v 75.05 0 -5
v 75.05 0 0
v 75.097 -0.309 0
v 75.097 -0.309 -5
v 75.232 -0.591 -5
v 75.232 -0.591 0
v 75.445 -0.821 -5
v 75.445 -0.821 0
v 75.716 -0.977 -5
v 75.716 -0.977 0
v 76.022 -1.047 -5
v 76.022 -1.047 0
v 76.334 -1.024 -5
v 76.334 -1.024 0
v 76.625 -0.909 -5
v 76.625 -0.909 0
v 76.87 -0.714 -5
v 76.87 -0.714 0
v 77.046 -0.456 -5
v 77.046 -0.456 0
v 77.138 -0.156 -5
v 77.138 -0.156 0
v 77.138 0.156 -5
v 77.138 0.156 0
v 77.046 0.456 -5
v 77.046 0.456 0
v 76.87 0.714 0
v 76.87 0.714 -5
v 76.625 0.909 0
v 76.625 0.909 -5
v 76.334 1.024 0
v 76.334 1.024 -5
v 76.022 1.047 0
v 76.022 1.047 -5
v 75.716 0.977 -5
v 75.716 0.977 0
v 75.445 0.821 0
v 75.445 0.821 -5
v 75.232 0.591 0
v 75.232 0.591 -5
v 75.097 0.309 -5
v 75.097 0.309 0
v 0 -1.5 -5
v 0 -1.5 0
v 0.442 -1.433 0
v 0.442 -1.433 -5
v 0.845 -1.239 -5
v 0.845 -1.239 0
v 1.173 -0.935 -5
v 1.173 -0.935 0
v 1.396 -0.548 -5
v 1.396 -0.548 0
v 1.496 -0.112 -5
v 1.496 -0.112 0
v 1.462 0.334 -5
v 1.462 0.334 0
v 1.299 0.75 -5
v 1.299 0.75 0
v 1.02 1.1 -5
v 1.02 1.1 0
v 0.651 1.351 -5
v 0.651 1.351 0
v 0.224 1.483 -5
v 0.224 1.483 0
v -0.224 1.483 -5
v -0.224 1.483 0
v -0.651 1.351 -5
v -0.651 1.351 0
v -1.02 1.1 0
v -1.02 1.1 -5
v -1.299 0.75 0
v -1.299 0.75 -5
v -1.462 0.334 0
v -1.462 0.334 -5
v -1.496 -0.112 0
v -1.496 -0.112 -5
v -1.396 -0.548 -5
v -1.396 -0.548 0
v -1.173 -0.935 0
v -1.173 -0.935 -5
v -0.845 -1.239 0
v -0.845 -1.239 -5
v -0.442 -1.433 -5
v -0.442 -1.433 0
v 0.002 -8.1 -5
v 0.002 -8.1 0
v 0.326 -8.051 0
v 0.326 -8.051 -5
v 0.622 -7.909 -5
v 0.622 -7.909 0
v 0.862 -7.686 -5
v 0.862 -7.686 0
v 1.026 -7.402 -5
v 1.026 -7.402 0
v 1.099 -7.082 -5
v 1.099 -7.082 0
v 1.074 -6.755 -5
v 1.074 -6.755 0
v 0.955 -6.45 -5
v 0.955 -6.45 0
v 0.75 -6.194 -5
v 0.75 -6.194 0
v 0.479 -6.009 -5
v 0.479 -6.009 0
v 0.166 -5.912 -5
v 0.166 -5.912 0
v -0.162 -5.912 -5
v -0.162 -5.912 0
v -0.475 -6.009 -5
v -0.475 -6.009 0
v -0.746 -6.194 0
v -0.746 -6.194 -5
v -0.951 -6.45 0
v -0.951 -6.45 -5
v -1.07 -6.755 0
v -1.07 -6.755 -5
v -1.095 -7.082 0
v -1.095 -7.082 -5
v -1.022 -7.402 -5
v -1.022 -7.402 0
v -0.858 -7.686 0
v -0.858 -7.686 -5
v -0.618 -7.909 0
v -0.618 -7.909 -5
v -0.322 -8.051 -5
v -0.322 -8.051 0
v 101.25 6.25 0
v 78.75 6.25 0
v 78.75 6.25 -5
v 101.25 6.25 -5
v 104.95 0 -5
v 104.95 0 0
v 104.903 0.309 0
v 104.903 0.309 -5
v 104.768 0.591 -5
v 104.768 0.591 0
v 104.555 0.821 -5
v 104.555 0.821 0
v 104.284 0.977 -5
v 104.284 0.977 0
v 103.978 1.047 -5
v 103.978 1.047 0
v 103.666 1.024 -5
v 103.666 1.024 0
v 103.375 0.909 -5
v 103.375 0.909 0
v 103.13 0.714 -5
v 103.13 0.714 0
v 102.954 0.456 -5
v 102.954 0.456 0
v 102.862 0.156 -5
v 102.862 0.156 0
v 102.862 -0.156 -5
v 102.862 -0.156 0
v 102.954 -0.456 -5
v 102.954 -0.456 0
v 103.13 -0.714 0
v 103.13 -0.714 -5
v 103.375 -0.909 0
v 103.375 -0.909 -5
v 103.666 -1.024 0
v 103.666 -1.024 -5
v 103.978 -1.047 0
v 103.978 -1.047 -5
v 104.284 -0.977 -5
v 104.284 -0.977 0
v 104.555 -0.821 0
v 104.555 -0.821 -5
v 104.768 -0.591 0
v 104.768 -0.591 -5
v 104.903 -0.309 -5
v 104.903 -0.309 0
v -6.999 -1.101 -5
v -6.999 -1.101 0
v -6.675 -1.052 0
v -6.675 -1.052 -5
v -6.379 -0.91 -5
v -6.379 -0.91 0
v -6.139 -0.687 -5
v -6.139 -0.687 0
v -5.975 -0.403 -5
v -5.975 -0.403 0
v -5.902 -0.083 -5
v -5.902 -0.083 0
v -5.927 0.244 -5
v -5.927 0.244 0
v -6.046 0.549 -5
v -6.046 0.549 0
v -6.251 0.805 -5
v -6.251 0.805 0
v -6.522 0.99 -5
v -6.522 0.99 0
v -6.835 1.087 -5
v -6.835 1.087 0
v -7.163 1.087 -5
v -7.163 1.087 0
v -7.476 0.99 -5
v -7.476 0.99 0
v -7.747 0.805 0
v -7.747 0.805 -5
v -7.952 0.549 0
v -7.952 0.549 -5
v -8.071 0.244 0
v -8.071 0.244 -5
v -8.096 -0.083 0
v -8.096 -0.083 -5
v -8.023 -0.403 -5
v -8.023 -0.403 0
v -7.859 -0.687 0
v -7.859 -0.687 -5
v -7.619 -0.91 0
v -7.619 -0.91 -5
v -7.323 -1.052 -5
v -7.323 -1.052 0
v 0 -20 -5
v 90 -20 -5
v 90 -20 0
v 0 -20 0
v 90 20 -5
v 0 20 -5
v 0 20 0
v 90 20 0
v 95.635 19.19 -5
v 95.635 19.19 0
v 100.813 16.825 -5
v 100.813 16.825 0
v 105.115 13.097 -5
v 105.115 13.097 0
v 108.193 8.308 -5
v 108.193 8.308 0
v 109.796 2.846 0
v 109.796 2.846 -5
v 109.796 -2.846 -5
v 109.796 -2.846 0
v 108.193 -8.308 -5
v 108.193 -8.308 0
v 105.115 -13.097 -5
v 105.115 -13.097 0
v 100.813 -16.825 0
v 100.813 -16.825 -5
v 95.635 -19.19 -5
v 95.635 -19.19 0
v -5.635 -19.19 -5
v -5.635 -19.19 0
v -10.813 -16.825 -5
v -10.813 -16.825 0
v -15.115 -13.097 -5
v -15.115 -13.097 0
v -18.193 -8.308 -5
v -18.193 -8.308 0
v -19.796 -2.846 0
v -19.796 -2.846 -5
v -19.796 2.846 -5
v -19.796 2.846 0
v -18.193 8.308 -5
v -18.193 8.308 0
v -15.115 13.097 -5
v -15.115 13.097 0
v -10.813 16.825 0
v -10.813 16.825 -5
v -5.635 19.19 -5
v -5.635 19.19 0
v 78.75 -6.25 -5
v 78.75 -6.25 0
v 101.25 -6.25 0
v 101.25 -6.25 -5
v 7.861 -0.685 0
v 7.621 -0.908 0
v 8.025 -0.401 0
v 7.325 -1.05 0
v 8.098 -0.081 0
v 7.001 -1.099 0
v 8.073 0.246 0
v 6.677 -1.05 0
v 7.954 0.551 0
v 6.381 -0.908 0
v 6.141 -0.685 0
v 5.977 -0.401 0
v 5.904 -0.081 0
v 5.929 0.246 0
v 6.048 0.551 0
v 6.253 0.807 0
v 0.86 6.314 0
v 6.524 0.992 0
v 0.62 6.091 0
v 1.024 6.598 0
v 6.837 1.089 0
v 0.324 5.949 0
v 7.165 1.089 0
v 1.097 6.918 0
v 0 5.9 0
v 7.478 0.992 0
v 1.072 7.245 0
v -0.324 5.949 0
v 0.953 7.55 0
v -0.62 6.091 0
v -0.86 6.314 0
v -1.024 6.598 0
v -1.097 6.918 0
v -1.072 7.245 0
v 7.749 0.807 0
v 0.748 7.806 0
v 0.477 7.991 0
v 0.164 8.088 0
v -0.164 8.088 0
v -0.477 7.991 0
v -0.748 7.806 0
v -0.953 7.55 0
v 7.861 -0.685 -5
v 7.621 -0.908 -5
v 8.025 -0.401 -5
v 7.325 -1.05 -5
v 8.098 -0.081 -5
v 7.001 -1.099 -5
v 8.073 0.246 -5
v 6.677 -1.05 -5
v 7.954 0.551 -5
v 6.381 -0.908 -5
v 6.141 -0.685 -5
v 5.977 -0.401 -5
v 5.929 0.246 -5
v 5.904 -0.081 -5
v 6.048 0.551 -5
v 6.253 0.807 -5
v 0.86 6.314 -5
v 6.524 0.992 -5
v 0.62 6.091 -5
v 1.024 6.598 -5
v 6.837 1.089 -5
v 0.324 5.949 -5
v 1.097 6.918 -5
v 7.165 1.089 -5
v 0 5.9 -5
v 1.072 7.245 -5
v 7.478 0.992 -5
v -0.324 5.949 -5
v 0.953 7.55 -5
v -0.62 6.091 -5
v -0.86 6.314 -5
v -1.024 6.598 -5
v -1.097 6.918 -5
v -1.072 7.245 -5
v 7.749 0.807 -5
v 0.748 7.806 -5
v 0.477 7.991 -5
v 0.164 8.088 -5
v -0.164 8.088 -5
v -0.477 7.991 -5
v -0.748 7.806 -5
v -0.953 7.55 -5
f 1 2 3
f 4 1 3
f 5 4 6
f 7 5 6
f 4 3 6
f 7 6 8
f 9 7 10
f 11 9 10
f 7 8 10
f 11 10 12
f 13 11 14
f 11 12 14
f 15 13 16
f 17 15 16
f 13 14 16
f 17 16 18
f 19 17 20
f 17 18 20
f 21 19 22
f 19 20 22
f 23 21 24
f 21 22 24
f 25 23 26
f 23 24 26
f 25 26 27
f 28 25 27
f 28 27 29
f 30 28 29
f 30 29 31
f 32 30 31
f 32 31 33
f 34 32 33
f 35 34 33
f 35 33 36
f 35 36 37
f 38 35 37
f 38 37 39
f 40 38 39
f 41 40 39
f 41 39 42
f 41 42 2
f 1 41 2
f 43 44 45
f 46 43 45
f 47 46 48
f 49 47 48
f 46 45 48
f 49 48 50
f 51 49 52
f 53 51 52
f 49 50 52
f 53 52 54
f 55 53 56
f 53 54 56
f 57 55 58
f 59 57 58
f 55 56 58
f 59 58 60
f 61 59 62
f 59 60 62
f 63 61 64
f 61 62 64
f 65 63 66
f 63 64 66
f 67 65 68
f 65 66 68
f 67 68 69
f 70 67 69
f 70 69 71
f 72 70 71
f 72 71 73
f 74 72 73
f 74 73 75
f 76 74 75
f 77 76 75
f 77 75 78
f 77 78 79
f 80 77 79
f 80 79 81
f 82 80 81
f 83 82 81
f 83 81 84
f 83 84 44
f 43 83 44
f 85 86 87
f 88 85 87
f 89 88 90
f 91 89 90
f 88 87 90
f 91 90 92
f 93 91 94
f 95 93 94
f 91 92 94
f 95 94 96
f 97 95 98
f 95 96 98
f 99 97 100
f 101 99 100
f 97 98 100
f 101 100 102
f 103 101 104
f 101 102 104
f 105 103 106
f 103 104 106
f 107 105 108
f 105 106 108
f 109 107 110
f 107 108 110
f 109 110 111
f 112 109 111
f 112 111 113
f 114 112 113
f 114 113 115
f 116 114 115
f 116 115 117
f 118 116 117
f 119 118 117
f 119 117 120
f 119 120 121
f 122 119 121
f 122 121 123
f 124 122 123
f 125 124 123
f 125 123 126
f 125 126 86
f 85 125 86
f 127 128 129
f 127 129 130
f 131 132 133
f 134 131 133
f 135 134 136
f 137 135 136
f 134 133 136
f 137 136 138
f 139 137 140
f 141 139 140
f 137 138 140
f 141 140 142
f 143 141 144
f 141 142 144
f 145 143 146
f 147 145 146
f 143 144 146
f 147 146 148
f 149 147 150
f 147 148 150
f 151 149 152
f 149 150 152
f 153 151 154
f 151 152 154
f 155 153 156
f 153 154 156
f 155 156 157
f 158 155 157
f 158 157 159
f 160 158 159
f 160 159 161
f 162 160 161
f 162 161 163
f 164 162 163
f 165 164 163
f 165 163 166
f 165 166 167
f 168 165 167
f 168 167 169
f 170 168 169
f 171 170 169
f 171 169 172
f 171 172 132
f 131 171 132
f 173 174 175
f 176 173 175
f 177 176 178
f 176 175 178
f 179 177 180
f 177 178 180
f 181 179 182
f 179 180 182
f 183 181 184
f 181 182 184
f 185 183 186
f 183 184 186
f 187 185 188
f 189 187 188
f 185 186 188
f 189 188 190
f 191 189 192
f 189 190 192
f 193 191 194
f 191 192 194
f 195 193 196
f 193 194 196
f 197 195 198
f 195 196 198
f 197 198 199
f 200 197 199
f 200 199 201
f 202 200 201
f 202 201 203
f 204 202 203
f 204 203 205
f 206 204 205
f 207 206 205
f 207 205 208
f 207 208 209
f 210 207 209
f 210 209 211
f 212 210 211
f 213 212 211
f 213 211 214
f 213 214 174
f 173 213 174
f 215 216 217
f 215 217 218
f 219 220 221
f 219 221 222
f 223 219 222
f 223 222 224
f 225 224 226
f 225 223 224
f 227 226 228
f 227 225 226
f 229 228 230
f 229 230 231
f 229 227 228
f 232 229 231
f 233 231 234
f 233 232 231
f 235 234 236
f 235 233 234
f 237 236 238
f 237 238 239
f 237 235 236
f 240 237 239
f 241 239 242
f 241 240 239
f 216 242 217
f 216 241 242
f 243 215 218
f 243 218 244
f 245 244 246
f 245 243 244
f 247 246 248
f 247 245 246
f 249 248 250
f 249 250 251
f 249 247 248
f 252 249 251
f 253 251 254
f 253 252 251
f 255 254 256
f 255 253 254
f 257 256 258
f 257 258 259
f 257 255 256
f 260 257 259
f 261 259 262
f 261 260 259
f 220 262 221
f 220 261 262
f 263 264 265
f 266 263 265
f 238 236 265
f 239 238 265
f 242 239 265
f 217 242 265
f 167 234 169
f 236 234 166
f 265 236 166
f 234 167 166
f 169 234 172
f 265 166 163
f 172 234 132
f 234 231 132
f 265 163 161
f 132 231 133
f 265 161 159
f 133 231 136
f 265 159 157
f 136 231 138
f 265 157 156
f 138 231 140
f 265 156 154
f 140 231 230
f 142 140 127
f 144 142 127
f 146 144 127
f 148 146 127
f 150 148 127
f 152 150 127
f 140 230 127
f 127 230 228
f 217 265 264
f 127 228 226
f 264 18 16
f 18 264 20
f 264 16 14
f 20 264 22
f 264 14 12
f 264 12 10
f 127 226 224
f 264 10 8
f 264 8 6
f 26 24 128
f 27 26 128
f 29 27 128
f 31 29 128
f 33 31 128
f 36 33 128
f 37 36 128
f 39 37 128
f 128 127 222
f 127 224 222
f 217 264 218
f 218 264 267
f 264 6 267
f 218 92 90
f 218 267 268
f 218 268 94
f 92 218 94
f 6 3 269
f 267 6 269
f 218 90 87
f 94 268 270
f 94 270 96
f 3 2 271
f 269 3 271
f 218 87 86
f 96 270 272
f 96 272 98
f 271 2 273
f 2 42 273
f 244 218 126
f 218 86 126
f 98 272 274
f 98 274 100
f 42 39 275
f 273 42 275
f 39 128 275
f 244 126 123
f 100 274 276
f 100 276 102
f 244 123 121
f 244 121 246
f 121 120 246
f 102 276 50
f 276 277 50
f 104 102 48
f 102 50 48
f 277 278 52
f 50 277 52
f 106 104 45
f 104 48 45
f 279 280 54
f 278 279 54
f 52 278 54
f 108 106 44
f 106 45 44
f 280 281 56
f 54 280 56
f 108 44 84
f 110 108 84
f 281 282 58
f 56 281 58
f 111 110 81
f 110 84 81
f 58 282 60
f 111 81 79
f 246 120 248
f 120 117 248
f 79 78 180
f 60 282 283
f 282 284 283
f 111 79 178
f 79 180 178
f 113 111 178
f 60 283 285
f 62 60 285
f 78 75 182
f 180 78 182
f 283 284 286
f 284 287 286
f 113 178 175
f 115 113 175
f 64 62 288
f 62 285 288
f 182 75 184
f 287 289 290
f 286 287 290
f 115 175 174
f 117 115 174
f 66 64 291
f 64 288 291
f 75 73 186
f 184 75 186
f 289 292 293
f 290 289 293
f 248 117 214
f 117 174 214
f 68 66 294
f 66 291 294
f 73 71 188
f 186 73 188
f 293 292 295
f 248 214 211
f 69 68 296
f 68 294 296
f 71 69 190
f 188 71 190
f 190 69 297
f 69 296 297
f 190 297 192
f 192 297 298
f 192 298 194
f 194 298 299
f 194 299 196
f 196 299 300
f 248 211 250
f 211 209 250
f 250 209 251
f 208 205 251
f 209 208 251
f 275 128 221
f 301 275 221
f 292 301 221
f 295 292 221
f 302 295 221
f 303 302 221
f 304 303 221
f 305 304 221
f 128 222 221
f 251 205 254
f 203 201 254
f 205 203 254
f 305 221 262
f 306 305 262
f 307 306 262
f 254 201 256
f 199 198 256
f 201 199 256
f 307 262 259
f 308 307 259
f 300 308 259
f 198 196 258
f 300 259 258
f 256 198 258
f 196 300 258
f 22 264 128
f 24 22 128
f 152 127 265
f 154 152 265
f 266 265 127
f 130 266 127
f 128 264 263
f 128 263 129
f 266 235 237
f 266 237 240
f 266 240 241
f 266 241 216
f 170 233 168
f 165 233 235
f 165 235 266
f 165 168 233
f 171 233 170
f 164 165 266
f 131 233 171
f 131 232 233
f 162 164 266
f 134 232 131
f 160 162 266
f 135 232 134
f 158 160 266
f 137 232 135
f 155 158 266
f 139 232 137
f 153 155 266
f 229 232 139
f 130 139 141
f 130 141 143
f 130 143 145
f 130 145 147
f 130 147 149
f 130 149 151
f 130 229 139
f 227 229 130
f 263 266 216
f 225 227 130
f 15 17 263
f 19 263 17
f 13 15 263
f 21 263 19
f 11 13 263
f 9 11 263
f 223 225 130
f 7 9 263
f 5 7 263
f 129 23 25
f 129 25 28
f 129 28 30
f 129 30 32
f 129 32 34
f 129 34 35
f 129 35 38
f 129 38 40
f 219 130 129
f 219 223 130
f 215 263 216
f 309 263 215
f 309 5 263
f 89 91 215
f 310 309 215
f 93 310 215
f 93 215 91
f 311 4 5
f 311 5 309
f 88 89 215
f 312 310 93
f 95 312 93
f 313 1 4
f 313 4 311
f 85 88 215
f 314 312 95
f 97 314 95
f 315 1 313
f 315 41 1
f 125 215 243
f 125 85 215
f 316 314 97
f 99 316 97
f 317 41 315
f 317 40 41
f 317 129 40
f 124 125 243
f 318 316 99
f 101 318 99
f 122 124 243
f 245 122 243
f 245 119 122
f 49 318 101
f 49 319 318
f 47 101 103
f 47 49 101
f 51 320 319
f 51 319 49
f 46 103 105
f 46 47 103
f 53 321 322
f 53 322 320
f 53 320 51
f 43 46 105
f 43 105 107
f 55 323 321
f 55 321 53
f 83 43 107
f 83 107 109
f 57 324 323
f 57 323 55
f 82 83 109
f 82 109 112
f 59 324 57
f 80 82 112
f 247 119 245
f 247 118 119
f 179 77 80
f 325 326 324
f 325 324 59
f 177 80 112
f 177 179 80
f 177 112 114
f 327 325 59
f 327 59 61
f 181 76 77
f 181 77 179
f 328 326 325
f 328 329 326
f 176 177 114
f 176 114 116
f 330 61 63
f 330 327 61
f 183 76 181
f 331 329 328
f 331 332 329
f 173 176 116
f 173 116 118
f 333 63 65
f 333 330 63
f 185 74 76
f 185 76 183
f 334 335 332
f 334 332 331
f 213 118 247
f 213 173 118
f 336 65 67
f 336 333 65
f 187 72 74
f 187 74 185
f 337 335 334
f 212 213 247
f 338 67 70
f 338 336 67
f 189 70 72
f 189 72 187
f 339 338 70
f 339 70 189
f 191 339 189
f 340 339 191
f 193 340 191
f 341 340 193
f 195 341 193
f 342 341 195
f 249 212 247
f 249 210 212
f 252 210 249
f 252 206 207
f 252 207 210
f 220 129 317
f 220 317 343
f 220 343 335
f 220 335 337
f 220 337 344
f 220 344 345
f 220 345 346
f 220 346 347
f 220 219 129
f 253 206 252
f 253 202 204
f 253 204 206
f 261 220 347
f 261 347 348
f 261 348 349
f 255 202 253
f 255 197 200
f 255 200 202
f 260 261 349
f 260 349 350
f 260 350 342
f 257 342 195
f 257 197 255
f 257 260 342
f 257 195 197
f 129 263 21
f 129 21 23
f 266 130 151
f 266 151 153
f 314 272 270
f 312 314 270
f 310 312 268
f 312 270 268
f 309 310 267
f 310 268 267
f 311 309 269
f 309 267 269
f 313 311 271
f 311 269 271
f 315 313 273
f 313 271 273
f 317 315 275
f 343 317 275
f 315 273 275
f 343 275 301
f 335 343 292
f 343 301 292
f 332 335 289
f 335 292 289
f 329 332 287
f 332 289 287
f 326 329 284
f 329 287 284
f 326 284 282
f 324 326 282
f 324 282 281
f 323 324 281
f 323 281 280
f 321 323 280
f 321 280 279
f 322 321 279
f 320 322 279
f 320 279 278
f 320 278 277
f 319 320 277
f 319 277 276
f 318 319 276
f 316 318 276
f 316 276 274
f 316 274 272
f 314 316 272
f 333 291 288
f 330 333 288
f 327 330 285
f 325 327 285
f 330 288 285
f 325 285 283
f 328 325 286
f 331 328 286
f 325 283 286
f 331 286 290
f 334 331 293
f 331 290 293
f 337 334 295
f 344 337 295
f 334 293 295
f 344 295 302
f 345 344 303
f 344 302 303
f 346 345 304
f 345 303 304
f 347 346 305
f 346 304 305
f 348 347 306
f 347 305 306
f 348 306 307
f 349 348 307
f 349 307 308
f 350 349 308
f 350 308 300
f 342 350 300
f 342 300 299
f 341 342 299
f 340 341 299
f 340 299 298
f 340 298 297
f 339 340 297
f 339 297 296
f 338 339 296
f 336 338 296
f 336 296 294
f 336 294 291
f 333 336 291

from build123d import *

# Parameters (mm, degrees)
BOSS_EXTRUDE1_DEPTH   = 5
CUT_EXTRUDE1_REACH    = 113.915
SKETCH2_R             = 1.5
SKETCH2_R_2           = 1.1
BODY_MOVE_COPY1_ANGLE = 90
SKETCH19_R            = 1.05
SKETCH19_W            = 22.5
SKETCH19_H            = 12.5
CUT_EXTRUDE9_DEPTH    = 112.915146428


with BuildPart() as part:
    # Sketch1 → Boss-Extrude1 (new body)
    with BuildSketch(Plane(origin=(0, 0, 0), x_dir=(1, 0, 0), z_dir=(0, 1, 0))):
        with BuildLine():
            Line((90, -20), (0, -20))
            ThreePointArc((0, -20), (-20, 0), (0, 20))
            Line((0, 20), (90, 20))
            ThreePointArc((90, 20), (110, 0), (90, -20))
        make_face()
    extrude(amount=BOSS_EXTRUDE1_DEPTH)

    # Sketch2 → Cut-Extrude1 (cut, up to next)
    with BuildSketch(Plane(origin=(0, 5, 0), x_dir=(1, 0, 0), z_dir=(0, 1, 0)), mode=Mode.PRIVATE) as cut_extrude1_sk1:
        with Locations(Location((0, 0, 0), (0, 0, 270))):
            Circle(SKETCH2_R)
    cut_extrude1_tool1 = extrude(cut_extrude1_sk1.sketch, amount=-CUT_EXTRUDE1_REACH, mode=Mode.PRIVATE) & part.part
    # Sketch2 → Cut-Extrude1 (cut, up to next)
    with BuildSketch(Plane(origin=(0, 5, 0), x_dir=(1, 0, 0), z_dir=(0, 1, 0)), mode=Mode.PRIVATE) as cut_extrude1_sk2:
        with Locations(Location((0, 7, 0), (0, 0, 270))):
            Circle(SKETCH2_R_2)
    cut_extrude1_tool2 = extrude(cut_extrude1_sk2.sketch, amount=-CUT_EXTRUDE1_REACH, mode=Mode.PRIVATE) & part.part
    # Sketch2 → Cut-Extrude1 (cut, up to next)
    with BuildSketch(Plane(origin=(0, 5, 0), x_dir=(1, 0, 0), z_dir=(0, 1, 0)), mode=Mode.PRIVATE) as cut_extrude1_sk3:
        with Locations(Location((7.001, 0.001, 0), (0, 0, 270))):
            Circle(SKETCH2_R_2)
    cut_extrude1_tool3 = extrude(cut_extrude1_sk3.sketch, amount=-CUT_EXTRUDE1_REACH, mode=Mode.PRIVATE) & part.part
    # Sketch2 → Cut-Extrude1 (cut, up to next)
    with BuildSketch(Plane(origin=(0, 5, 0), x_dir=(1, 0, 0), z_dir=(0, 1, 0)), mode=Mode.PRIVATE) as cut_extrude1_sk4:
        with Locations(Location((0.002, -7, 0), (0, 0, 270))):
            Circle(SKETCH2_R_2)
    cut_extrude1_tool4 = extrude(cut_extrude1_sk4.sketch, amount=-CUT_EXTRUDE1_REACH, mode=Mode.PRIVATE) & part.part
    # Sketch2 → Cut-Extrude1 (cut, up to next)
    with BuildSketch(Plane(origin=(0, 5, 0), x_dir=(1, 0, 0), z_dir=(0, 1, 0)), mode=Mode.PRIVATE) as cut_extrude1_sk5:
        with Locations(Location((-6.999, -0.001, 0), (0, 0, 270))):
            Circle(SKETCH2_R_2)
    cut_extrude1_tool5 = extrude(cut_extrude1_sk5.sketch, amount=-CUT_EXTRUDE1_REACH, mode=Mode.PRIVATE) & part.part
    add(cut_extrude1_tool1.solids().sort_by_distance((0, 5, 0))[0], mode=Mode.SUBTRACT)
    add(cut_extrude1_tool2.solids().sort_by_distance((0, 5, -7))[0], mode=Mode.SUBTRACT)
    add(cut_extrude1_tool3.solids().sort_by_distance((7.001, 5, -0.001))[0], mode=Mode.SUBTRACT)
    add(cut_extrude1_tool4.solids().sort_by_distance((0.002, 5, 7))[0], mode=Mode.SUBTRACT)
    add(cut_extrude1_tool5.solids().sort_by_distance((-6.999, 5, 0.001))[0], mode=Mode.SUBTRACT)


with BuildPart() as part_1:
    # Body-Move/Copy1: moved
    add(part.part.rotate(Axis((0, 0, 0), (1, 0, 0)), BODY_MOVE_COPY1_ANGLE))

    # Sketch19 → Cut-Extrude9 (cut, through all)
    with BuildSketch(Plane.XY.offset(5)):
        with Locations((103.9, 0)):
            Circle(SKETCH19_R)
        with Locations(Location((76.1, 0, 0), (0, 0, 180))):
            Circle(SKETCH19_R)
        with Locations((90, 0)):
            Rectangle(SKETCH19_W, SKETCH19_H)
    extrude(amount=-CUT_EXTRUDE9_DEPTH, mode=Mode.SUBTRACT)


with BuildPart() as part_2:
    # Body-Move/Copy2: moved
    add(part_1.part.moved(Location((0, 0, -5))))


solid = part_2.part
